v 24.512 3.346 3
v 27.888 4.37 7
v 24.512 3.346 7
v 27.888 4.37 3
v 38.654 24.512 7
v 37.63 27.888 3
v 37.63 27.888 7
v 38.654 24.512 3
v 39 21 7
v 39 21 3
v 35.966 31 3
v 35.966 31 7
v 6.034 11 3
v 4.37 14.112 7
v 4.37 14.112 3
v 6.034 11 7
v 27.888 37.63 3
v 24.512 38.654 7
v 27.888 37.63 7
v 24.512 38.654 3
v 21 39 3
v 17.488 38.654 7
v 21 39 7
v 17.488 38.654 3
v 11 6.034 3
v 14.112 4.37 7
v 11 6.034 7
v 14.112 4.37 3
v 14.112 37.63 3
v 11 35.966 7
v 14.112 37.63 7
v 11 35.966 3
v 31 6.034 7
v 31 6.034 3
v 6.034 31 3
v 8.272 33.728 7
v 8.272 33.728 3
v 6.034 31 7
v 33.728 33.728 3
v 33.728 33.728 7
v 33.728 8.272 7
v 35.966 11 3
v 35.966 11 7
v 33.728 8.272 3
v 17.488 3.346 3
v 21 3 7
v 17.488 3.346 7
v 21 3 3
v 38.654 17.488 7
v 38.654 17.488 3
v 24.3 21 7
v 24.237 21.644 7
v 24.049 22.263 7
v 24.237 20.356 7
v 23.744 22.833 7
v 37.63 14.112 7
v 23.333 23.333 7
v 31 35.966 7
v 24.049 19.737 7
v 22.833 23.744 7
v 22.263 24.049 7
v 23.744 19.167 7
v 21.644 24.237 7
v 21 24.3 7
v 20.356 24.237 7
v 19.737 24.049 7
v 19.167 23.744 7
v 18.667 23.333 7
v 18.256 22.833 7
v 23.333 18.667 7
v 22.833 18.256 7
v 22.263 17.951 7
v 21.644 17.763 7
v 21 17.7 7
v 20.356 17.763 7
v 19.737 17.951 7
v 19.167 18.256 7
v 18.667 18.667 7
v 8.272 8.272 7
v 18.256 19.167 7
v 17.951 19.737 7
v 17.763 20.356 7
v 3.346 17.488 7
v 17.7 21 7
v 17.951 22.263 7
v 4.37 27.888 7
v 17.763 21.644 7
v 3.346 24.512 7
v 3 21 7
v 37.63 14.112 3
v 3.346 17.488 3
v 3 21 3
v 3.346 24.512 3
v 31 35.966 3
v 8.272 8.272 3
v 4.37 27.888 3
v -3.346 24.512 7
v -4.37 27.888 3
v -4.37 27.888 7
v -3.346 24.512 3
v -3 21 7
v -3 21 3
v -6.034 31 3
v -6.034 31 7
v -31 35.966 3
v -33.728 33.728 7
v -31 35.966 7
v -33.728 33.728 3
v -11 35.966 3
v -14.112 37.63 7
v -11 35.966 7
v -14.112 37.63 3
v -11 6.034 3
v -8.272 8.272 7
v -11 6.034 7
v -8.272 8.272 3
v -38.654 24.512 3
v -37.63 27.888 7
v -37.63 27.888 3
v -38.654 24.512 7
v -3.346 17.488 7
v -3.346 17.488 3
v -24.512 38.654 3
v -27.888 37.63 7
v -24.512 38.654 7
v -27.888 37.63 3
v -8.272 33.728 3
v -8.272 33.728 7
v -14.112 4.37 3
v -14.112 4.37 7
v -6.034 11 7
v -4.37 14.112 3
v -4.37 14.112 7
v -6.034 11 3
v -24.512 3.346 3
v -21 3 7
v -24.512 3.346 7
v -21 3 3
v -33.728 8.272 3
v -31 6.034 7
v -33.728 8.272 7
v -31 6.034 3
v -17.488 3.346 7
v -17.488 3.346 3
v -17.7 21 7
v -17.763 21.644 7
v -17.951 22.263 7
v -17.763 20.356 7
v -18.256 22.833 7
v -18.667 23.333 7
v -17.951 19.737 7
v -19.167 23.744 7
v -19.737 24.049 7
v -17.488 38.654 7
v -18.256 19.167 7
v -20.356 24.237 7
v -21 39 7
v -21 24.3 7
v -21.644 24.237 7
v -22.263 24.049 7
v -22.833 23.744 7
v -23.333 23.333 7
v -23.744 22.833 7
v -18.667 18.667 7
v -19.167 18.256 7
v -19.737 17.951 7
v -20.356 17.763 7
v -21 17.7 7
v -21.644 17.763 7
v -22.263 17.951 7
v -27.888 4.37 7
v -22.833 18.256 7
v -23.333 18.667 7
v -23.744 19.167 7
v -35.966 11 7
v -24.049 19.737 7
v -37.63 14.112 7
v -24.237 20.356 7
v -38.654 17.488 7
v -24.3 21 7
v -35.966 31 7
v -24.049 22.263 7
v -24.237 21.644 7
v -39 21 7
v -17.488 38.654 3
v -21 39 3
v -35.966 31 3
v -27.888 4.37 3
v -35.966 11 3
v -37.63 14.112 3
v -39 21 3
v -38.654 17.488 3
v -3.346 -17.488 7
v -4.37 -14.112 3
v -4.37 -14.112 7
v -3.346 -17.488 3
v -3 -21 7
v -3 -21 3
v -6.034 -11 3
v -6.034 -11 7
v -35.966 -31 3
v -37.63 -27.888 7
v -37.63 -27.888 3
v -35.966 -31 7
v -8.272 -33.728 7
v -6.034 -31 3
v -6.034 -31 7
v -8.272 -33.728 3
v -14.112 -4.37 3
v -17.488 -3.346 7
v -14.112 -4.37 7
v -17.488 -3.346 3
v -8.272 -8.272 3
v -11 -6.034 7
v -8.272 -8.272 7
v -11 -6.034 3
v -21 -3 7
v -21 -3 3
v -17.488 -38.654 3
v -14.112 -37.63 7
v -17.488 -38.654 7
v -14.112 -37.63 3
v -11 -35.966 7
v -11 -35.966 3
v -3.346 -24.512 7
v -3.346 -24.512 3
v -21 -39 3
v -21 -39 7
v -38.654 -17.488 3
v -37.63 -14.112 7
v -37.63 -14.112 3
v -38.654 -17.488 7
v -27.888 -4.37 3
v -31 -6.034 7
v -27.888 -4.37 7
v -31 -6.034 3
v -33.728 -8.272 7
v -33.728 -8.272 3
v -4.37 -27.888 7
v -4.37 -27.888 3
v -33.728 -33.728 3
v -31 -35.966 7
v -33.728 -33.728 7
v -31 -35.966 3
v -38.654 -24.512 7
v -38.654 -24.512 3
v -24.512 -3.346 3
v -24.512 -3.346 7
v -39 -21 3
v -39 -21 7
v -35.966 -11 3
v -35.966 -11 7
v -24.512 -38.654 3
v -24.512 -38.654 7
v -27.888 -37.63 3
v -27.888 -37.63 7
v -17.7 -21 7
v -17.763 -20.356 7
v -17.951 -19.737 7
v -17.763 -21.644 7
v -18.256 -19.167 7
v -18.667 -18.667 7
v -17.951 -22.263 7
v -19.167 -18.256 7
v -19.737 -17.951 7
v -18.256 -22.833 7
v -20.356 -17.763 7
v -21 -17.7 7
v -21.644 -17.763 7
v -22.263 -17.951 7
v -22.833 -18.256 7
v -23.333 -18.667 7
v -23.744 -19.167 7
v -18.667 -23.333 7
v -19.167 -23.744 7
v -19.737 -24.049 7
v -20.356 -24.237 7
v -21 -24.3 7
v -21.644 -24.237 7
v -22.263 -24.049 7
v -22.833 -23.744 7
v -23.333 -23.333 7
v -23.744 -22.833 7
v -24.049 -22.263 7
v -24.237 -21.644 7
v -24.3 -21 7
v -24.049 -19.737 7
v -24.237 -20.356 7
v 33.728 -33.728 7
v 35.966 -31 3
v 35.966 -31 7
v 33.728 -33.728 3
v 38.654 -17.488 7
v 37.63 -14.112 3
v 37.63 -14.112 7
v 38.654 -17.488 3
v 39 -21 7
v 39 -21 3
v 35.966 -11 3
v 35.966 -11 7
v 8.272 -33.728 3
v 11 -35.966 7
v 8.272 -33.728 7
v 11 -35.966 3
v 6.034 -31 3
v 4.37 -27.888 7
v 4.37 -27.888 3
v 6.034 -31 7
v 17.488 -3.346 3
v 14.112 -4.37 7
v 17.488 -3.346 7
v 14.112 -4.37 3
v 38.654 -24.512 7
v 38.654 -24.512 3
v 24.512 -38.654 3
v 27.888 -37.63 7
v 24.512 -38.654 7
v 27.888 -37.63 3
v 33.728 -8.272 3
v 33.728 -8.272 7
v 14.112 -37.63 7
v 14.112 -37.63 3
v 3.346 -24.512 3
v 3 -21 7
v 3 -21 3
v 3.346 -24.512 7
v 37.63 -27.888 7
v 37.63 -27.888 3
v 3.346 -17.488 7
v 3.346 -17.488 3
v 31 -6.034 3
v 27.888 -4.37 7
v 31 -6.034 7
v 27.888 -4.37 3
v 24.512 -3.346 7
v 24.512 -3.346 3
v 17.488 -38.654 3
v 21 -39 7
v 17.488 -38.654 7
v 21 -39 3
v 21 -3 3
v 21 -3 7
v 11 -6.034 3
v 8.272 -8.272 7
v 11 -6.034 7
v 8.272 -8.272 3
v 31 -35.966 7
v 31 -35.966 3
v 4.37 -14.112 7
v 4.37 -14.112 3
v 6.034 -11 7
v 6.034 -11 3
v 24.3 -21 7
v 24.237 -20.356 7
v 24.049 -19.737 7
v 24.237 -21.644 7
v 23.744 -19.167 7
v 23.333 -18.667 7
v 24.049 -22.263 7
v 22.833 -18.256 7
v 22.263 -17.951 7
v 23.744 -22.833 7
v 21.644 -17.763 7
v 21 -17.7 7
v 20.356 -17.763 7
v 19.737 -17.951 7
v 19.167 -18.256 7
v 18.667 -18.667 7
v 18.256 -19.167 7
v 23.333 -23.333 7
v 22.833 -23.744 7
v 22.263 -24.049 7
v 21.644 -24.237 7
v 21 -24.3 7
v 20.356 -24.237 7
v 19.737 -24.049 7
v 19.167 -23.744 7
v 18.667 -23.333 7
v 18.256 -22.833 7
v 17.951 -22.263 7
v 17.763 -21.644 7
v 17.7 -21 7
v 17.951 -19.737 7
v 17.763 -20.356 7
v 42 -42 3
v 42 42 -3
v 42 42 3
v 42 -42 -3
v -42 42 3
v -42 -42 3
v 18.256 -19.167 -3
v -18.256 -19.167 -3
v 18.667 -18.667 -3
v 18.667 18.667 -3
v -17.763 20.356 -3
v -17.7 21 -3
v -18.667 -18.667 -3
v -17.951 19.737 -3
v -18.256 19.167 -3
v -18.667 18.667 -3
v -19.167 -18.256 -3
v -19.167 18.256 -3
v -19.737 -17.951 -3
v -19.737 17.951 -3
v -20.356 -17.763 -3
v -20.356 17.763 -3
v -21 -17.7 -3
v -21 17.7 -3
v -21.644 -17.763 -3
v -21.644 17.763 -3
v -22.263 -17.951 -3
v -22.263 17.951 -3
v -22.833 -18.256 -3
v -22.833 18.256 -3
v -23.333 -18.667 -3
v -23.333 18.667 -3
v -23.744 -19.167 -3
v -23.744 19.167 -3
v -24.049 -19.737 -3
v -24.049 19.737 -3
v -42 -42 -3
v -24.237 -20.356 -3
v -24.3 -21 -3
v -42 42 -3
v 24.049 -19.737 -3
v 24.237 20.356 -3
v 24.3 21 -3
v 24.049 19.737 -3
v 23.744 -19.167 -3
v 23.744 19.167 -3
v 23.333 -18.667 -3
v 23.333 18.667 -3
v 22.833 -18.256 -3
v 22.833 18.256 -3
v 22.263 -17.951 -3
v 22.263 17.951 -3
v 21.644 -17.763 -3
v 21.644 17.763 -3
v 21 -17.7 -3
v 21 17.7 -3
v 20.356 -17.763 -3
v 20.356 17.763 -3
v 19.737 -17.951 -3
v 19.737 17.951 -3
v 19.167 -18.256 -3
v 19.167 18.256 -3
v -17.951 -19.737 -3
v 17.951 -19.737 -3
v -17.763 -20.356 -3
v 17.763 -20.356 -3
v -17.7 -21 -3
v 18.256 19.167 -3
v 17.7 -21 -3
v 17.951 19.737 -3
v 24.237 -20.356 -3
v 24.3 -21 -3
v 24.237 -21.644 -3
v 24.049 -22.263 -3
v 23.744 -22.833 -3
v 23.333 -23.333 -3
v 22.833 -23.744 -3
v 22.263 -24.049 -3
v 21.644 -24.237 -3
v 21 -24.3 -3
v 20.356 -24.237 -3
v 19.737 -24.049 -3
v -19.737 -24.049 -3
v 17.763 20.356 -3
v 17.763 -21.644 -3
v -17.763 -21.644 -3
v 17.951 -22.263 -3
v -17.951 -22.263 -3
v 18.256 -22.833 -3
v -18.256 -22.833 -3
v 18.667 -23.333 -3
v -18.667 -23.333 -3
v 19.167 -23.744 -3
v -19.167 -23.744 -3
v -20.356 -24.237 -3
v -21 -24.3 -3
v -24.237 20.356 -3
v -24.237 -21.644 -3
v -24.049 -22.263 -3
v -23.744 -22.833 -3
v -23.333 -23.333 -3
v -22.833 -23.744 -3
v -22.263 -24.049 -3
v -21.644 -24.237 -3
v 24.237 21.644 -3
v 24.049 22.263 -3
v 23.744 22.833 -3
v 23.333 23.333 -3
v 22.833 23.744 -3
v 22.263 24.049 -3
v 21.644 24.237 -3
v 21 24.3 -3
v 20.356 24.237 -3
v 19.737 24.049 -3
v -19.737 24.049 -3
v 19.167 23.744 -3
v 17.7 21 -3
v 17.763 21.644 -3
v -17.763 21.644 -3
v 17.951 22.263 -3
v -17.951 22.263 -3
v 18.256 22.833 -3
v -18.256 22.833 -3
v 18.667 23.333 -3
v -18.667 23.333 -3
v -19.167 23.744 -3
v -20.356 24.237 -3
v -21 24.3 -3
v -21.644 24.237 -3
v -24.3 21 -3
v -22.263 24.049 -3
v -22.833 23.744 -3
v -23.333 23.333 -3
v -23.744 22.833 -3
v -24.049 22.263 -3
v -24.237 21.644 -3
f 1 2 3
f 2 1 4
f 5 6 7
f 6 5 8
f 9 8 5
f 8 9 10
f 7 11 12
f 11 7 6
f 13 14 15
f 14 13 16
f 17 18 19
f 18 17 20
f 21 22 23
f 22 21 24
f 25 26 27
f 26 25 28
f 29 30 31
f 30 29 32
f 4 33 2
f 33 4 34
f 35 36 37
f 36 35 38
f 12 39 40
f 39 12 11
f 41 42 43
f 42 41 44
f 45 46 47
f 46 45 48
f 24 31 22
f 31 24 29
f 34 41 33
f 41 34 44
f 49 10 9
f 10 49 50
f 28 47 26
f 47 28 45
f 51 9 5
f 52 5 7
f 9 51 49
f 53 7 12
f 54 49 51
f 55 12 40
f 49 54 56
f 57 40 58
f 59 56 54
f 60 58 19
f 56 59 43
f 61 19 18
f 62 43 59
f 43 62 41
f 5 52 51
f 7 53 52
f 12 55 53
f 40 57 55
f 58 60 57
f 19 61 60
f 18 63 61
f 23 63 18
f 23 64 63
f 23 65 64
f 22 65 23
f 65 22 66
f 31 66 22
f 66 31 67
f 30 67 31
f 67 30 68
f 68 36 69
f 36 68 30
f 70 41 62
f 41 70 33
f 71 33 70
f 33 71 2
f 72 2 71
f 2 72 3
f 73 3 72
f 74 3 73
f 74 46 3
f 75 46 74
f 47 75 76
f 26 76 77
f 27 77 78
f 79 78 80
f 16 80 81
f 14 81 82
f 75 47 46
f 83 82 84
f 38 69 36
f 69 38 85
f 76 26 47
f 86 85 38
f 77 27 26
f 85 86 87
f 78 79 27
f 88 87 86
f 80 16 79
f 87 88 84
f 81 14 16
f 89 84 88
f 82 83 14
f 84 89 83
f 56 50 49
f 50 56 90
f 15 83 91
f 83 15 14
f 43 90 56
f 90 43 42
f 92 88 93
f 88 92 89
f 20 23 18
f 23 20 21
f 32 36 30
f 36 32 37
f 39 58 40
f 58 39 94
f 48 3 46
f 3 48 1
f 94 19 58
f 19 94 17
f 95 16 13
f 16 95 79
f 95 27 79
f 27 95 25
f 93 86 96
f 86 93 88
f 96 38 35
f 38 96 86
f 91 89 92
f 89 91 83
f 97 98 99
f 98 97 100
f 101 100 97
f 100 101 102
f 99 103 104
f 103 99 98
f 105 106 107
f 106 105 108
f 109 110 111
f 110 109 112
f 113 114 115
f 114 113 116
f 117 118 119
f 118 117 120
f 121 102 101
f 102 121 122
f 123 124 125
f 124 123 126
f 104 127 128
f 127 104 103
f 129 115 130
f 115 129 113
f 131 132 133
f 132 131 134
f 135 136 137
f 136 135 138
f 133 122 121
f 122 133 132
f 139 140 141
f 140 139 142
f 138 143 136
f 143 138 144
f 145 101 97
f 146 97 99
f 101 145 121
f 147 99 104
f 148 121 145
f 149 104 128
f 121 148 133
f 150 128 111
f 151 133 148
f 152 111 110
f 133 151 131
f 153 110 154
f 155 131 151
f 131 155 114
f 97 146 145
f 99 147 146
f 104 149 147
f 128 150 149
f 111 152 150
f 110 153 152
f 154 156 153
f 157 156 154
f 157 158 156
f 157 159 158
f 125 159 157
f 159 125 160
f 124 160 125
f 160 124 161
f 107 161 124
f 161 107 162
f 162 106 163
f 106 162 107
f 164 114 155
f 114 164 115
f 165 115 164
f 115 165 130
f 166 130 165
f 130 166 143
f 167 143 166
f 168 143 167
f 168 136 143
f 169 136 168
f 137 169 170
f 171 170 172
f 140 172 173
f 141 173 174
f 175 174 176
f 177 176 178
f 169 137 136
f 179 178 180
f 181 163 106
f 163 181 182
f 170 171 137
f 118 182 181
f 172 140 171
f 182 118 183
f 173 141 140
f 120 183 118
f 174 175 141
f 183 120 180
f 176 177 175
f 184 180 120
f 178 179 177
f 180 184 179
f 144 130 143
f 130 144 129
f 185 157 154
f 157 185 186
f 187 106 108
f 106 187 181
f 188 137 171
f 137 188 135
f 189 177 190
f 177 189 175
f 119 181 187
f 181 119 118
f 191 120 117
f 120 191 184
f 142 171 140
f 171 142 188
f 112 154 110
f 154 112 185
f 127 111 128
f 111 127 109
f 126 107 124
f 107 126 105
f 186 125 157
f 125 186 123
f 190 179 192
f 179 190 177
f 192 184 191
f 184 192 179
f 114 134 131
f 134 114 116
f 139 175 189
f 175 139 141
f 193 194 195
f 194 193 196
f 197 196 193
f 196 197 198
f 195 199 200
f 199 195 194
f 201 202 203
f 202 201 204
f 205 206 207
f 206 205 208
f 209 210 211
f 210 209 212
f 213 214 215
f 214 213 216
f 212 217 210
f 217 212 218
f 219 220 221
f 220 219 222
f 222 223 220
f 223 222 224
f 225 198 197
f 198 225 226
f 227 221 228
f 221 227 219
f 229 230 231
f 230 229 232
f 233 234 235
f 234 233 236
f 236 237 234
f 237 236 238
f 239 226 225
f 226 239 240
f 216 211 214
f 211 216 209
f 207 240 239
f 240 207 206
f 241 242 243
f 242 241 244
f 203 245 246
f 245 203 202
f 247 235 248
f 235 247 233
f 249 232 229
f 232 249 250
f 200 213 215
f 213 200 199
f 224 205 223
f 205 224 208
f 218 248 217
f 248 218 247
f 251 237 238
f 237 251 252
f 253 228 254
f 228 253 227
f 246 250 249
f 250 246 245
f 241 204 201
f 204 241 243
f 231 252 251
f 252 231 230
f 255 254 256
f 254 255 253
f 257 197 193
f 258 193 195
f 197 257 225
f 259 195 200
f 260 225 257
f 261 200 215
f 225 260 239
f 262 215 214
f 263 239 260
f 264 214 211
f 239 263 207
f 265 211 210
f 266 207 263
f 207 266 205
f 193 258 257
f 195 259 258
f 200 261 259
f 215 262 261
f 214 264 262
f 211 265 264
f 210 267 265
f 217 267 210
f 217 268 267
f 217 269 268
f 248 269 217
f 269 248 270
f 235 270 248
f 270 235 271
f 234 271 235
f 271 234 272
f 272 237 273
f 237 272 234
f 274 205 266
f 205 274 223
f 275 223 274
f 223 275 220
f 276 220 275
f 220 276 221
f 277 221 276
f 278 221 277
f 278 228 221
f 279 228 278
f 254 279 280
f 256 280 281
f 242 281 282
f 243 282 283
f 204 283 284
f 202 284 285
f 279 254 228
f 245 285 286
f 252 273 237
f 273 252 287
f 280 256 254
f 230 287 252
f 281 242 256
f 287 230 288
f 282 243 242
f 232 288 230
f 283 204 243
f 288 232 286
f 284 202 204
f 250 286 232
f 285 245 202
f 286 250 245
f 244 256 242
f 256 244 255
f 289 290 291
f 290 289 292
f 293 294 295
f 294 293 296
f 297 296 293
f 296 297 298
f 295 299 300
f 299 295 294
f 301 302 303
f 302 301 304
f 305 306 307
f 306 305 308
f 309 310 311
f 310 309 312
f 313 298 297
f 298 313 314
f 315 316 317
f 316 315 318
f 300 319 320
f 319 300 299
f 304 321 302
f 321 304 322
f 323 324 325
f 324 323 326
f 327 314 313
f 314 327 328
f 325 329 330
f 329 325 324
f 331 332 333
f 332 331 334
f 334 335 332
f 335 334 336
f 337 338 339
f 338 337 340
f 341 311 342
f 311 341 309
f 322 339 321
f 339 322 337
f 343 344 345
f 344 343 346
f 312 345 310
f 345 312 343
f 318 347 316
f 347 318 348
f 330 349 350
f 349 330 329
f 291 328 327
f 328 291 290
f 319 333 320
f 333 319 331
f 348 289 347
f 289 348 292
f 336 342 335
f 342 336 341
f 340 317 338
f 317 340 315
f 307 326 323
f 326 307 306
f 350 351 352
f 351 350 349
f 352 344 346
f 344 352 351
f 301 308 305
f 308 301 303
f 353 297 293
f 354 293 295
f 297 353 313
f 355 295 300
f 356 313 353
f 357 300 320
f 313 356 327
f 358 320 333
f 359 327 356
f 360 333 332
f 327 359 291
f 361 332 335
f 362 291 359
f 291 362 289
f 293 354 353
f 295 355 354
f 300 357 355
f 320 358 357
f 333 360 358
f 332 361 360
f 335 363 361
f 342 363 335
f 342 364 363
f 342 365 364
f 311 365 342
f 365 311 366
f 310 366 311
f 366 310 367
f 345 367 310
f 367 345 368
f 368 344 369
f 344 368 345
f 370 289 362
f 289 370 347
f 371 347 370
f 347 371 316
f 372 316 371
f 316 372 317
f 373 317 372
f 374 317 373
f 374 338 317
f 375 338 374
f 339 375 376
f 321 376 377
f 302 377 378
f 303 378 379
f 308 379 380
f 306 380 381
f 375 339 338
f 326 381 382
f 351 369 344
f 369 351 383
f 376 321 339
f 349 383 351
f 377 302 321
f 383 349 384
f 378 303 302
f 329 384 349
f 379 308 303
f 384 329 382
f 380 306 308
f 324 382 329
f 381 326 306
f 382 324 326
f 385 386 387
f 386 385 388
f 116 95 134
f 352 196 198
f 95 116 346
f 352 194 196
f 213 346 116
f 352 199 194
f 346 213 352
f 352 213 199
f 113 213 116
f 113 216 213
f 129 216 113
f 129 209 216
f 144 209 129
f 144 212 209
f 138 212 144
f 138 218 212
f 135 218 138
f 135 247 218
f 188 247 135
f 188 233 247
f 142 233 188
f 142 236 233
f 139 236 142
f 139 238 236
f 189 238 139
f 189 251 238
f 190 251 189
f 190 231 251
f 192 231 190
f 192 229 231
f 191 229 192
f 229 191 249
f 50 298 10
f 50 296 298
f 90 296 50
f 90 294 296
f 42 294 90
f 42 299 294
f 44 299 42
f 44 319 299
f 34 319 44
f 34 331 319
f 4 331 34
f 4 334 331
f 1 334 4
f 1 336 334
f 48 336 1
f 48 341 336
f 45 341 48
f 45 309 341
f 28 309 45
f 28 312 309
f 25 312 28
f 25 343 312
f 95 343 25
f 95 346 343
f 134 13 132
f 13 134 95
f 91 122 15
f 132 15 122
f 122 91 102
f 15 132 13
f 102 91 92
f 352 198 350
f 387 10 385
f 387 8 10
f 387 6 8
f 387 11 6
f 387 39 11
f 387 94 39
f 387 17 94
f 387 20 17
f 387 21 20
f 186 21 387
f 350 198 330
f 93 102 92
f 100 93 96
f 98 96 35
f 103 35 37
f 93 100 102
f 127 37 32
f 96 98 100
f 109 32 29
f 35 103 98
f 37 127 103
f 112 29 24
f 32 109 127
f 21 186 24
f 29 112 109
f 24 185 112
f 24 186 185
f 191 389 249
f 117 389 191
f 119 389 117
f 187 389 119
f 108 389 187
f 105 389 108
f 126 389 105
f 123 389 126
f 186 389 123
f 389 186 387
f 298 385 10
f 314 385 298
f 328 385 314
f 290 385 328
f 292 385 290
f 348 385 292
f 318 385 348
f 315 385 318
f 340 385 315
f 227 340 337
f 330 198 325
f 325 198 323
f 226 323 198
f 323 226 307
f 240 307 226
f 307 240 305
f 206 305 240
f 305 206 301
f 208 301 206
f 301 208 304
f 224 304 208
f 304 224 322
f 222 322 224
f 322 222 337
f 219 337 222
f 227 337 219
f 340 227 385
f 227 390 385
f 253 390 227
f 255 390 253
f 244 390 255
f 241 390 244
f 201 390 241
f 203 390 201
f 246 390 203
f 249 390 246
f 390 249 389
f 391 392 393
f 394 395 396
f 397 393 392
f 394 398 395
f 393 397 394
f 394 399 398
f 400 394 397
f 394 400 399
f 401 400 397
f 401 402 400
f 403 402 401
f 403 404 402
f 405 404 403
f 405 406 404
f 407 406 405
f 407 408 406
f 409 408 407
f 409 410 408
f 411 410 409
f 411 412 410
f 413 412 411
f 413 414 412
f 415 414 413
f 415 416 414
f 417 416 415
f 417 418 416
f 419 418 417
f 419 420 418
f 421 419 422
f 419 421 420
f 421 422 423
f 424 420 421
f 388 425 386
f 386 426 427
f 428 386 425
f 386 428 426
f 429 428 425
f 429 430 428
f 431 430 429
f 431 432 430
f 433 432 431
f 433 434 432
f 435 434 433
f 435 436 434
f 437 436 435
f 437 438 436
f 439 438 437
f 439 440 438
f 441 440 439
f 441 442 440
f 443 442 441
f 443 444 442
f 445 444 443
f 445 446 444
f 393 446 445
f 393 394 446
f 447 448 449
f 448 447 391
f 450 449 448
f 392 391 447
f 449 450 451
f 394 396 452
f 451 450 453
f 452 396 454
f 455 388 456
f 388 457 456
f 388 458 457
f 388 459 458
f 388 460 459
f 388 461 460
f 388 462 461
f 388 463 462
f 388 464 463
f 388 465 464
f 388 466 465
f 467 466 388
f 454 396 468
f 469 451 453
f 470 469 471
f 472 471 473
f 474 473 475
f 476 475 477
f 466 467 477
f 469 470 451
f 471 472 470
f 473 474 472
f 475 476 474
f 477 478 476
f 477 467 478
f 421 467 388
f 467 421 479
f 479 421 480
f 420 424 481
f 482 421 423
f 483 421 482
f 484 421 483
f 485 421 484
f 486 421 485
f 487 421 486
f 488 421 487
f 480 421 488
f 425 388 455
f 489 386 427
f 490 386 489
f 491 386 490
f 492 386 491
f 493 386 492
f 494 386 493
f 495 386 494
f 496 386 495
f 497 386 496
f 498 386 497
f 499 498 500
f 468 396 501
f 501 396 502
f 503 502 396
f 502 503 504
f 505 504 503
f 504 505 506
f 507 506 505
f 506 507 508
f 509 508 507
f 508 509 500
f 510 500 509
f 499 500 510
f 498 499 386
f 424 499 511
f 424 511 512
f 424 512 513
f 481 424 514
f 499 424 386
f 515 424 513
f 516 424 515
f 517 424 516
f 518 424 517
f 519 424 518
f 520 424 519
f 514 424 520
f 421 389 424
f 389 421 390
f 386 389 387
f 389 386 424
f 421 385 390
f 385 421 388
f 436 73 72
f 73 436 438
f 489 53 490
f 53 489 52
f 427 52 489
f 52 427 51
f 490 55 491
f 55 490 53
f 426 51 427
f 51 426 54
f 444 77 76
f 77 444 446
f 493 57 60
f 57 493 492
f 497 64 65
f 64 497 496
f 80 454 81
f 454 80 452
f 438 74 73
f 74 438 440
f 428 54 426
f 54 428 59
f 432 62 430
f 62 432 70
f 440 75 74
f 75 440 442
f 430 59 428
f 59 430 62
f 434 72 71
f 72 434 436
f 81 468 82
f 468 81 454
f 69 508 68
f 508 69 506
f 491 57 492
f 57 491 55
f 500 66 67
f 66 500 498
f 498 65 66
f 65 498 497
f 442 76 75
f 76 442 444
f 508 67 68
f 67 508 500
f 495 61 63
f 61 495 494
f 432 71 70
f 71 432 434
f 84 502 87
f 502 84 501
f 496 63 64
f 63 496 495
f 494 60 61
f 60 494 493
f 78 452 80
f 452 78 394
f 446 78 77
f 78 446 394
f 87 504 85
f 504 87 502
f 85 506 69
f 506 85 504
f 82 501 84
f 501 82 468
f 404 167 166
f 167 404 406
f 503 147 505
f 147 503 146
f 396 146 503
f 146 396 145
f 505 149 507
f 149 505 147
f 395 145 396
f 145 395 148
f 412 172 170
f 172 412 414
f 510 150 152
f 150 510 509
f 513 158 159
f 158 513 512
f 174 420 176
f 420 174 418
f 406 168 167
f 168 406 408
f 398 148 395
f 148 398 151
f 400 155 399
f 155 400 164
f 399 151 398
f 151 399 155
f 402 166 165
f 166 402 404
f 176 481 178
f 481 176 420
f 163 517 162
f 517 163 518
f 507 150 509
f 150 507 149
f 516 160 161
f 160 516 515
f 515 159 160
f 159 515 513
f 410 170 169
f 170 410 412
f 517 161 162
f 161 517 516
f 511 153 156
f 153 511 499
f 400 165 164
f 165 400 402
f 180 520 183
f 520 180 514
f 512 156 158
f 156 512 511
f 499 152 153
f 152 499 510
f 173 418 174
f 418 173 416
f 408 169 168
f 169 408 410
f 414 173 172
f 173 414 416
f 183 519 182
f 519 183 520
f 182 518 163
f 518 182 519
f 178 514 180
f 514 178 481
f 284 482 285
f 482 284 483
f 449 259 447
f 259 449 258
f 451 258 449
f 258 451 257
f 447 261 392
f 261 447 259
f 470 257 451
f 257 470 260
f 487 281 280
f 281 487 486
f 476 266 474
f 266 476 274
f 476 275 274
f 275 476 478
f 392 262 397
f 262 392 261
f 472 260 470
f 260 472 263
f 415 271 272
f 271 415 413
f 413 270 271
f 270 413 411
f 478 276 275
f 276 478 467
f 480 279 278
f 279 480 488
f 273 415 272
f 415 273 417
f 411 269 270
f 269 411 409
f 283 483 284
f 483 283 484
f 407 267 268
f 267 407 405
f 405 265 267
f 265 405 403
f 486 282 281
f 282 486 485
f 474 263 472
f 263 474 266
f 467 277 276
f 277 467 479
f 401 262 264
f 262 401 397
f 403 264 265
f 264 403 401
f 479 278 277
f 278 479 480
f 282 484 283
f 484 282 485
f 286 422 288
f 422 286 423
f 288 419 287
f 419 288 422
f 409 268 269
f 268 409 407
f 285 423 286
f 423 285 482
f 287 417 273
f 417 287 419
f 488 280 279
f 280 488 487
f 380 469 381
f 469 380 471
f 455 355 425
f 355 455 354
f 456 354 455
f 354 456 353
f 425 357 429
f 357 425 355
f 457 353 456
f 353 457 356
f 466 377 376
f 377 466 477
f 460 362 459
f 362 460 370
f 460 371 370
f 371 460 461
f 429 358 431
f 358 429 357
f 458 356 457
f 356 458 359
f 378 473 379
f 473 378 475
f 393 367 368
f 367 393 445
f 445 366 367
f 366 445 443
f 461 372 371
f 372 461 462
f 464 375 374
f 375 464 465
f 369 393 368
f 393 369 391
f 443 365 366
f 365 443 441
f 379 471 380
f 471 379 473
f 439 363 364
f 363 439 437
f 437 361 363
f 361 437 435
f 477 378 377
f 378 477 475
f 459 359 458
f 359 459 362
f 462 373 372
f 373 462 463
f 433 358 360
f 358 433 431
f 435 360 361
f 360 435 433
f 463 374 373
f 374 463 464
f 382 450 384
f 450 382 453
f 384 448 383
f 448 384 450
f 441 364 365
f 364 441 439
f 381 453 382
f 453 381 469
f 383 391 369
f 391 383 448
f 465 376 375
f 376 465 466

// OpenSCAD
$fn = 32;

// ----------------------------------------------------------------------
// Anchor pads 84 x 84 x 10
// four corner bosses with anchor holes
// ----------------------------------------------------------------------

// --- parameters (mm) ---
plate = [84, 84, 6];  // base plate size (x, y, z)
pads = 4;             // boss count, one per corner
edge = 21;            // boss centre offset from the plate edge
boss_d = 36;          // boss diameter
boss_h = 4;           // boss height above the base plate
hole_d = 6.6;         // hole diameter

// --- derived feature positions (mm) ---
height = plate[2] + boss_h;      // = 10   overall height of the part
corner_x = plate[0] / 2 - edge;  // = 21   boss centre X
corner_y = plate[1] / 2 - edge;  // = 21   boss centre Y
feature_centers = [
  [corner_x, corner_y],
  [-corner_x, corner_y],
  [-corner_x, -corner_y],
  [corner_x, -corner_y]
];   // boss centres, anchor holes are drilled there

// base plate, four bosses standing on it, anchor holes all the way through
difference() {
  union() {
    cube(plate, center = true);
    for (centre = feature_centers)
      translate([centre[0], centre[1], plate[2] / 2 - 1])
        cylinder(d = boss_d, h = boss_h + 1);
  }
  for (centre = feature_centers)
    translate([centre[0], centre[1], -height])
      cylinder(d = hole_d, h = 2 * height + 2);  // through boss and plate
}
